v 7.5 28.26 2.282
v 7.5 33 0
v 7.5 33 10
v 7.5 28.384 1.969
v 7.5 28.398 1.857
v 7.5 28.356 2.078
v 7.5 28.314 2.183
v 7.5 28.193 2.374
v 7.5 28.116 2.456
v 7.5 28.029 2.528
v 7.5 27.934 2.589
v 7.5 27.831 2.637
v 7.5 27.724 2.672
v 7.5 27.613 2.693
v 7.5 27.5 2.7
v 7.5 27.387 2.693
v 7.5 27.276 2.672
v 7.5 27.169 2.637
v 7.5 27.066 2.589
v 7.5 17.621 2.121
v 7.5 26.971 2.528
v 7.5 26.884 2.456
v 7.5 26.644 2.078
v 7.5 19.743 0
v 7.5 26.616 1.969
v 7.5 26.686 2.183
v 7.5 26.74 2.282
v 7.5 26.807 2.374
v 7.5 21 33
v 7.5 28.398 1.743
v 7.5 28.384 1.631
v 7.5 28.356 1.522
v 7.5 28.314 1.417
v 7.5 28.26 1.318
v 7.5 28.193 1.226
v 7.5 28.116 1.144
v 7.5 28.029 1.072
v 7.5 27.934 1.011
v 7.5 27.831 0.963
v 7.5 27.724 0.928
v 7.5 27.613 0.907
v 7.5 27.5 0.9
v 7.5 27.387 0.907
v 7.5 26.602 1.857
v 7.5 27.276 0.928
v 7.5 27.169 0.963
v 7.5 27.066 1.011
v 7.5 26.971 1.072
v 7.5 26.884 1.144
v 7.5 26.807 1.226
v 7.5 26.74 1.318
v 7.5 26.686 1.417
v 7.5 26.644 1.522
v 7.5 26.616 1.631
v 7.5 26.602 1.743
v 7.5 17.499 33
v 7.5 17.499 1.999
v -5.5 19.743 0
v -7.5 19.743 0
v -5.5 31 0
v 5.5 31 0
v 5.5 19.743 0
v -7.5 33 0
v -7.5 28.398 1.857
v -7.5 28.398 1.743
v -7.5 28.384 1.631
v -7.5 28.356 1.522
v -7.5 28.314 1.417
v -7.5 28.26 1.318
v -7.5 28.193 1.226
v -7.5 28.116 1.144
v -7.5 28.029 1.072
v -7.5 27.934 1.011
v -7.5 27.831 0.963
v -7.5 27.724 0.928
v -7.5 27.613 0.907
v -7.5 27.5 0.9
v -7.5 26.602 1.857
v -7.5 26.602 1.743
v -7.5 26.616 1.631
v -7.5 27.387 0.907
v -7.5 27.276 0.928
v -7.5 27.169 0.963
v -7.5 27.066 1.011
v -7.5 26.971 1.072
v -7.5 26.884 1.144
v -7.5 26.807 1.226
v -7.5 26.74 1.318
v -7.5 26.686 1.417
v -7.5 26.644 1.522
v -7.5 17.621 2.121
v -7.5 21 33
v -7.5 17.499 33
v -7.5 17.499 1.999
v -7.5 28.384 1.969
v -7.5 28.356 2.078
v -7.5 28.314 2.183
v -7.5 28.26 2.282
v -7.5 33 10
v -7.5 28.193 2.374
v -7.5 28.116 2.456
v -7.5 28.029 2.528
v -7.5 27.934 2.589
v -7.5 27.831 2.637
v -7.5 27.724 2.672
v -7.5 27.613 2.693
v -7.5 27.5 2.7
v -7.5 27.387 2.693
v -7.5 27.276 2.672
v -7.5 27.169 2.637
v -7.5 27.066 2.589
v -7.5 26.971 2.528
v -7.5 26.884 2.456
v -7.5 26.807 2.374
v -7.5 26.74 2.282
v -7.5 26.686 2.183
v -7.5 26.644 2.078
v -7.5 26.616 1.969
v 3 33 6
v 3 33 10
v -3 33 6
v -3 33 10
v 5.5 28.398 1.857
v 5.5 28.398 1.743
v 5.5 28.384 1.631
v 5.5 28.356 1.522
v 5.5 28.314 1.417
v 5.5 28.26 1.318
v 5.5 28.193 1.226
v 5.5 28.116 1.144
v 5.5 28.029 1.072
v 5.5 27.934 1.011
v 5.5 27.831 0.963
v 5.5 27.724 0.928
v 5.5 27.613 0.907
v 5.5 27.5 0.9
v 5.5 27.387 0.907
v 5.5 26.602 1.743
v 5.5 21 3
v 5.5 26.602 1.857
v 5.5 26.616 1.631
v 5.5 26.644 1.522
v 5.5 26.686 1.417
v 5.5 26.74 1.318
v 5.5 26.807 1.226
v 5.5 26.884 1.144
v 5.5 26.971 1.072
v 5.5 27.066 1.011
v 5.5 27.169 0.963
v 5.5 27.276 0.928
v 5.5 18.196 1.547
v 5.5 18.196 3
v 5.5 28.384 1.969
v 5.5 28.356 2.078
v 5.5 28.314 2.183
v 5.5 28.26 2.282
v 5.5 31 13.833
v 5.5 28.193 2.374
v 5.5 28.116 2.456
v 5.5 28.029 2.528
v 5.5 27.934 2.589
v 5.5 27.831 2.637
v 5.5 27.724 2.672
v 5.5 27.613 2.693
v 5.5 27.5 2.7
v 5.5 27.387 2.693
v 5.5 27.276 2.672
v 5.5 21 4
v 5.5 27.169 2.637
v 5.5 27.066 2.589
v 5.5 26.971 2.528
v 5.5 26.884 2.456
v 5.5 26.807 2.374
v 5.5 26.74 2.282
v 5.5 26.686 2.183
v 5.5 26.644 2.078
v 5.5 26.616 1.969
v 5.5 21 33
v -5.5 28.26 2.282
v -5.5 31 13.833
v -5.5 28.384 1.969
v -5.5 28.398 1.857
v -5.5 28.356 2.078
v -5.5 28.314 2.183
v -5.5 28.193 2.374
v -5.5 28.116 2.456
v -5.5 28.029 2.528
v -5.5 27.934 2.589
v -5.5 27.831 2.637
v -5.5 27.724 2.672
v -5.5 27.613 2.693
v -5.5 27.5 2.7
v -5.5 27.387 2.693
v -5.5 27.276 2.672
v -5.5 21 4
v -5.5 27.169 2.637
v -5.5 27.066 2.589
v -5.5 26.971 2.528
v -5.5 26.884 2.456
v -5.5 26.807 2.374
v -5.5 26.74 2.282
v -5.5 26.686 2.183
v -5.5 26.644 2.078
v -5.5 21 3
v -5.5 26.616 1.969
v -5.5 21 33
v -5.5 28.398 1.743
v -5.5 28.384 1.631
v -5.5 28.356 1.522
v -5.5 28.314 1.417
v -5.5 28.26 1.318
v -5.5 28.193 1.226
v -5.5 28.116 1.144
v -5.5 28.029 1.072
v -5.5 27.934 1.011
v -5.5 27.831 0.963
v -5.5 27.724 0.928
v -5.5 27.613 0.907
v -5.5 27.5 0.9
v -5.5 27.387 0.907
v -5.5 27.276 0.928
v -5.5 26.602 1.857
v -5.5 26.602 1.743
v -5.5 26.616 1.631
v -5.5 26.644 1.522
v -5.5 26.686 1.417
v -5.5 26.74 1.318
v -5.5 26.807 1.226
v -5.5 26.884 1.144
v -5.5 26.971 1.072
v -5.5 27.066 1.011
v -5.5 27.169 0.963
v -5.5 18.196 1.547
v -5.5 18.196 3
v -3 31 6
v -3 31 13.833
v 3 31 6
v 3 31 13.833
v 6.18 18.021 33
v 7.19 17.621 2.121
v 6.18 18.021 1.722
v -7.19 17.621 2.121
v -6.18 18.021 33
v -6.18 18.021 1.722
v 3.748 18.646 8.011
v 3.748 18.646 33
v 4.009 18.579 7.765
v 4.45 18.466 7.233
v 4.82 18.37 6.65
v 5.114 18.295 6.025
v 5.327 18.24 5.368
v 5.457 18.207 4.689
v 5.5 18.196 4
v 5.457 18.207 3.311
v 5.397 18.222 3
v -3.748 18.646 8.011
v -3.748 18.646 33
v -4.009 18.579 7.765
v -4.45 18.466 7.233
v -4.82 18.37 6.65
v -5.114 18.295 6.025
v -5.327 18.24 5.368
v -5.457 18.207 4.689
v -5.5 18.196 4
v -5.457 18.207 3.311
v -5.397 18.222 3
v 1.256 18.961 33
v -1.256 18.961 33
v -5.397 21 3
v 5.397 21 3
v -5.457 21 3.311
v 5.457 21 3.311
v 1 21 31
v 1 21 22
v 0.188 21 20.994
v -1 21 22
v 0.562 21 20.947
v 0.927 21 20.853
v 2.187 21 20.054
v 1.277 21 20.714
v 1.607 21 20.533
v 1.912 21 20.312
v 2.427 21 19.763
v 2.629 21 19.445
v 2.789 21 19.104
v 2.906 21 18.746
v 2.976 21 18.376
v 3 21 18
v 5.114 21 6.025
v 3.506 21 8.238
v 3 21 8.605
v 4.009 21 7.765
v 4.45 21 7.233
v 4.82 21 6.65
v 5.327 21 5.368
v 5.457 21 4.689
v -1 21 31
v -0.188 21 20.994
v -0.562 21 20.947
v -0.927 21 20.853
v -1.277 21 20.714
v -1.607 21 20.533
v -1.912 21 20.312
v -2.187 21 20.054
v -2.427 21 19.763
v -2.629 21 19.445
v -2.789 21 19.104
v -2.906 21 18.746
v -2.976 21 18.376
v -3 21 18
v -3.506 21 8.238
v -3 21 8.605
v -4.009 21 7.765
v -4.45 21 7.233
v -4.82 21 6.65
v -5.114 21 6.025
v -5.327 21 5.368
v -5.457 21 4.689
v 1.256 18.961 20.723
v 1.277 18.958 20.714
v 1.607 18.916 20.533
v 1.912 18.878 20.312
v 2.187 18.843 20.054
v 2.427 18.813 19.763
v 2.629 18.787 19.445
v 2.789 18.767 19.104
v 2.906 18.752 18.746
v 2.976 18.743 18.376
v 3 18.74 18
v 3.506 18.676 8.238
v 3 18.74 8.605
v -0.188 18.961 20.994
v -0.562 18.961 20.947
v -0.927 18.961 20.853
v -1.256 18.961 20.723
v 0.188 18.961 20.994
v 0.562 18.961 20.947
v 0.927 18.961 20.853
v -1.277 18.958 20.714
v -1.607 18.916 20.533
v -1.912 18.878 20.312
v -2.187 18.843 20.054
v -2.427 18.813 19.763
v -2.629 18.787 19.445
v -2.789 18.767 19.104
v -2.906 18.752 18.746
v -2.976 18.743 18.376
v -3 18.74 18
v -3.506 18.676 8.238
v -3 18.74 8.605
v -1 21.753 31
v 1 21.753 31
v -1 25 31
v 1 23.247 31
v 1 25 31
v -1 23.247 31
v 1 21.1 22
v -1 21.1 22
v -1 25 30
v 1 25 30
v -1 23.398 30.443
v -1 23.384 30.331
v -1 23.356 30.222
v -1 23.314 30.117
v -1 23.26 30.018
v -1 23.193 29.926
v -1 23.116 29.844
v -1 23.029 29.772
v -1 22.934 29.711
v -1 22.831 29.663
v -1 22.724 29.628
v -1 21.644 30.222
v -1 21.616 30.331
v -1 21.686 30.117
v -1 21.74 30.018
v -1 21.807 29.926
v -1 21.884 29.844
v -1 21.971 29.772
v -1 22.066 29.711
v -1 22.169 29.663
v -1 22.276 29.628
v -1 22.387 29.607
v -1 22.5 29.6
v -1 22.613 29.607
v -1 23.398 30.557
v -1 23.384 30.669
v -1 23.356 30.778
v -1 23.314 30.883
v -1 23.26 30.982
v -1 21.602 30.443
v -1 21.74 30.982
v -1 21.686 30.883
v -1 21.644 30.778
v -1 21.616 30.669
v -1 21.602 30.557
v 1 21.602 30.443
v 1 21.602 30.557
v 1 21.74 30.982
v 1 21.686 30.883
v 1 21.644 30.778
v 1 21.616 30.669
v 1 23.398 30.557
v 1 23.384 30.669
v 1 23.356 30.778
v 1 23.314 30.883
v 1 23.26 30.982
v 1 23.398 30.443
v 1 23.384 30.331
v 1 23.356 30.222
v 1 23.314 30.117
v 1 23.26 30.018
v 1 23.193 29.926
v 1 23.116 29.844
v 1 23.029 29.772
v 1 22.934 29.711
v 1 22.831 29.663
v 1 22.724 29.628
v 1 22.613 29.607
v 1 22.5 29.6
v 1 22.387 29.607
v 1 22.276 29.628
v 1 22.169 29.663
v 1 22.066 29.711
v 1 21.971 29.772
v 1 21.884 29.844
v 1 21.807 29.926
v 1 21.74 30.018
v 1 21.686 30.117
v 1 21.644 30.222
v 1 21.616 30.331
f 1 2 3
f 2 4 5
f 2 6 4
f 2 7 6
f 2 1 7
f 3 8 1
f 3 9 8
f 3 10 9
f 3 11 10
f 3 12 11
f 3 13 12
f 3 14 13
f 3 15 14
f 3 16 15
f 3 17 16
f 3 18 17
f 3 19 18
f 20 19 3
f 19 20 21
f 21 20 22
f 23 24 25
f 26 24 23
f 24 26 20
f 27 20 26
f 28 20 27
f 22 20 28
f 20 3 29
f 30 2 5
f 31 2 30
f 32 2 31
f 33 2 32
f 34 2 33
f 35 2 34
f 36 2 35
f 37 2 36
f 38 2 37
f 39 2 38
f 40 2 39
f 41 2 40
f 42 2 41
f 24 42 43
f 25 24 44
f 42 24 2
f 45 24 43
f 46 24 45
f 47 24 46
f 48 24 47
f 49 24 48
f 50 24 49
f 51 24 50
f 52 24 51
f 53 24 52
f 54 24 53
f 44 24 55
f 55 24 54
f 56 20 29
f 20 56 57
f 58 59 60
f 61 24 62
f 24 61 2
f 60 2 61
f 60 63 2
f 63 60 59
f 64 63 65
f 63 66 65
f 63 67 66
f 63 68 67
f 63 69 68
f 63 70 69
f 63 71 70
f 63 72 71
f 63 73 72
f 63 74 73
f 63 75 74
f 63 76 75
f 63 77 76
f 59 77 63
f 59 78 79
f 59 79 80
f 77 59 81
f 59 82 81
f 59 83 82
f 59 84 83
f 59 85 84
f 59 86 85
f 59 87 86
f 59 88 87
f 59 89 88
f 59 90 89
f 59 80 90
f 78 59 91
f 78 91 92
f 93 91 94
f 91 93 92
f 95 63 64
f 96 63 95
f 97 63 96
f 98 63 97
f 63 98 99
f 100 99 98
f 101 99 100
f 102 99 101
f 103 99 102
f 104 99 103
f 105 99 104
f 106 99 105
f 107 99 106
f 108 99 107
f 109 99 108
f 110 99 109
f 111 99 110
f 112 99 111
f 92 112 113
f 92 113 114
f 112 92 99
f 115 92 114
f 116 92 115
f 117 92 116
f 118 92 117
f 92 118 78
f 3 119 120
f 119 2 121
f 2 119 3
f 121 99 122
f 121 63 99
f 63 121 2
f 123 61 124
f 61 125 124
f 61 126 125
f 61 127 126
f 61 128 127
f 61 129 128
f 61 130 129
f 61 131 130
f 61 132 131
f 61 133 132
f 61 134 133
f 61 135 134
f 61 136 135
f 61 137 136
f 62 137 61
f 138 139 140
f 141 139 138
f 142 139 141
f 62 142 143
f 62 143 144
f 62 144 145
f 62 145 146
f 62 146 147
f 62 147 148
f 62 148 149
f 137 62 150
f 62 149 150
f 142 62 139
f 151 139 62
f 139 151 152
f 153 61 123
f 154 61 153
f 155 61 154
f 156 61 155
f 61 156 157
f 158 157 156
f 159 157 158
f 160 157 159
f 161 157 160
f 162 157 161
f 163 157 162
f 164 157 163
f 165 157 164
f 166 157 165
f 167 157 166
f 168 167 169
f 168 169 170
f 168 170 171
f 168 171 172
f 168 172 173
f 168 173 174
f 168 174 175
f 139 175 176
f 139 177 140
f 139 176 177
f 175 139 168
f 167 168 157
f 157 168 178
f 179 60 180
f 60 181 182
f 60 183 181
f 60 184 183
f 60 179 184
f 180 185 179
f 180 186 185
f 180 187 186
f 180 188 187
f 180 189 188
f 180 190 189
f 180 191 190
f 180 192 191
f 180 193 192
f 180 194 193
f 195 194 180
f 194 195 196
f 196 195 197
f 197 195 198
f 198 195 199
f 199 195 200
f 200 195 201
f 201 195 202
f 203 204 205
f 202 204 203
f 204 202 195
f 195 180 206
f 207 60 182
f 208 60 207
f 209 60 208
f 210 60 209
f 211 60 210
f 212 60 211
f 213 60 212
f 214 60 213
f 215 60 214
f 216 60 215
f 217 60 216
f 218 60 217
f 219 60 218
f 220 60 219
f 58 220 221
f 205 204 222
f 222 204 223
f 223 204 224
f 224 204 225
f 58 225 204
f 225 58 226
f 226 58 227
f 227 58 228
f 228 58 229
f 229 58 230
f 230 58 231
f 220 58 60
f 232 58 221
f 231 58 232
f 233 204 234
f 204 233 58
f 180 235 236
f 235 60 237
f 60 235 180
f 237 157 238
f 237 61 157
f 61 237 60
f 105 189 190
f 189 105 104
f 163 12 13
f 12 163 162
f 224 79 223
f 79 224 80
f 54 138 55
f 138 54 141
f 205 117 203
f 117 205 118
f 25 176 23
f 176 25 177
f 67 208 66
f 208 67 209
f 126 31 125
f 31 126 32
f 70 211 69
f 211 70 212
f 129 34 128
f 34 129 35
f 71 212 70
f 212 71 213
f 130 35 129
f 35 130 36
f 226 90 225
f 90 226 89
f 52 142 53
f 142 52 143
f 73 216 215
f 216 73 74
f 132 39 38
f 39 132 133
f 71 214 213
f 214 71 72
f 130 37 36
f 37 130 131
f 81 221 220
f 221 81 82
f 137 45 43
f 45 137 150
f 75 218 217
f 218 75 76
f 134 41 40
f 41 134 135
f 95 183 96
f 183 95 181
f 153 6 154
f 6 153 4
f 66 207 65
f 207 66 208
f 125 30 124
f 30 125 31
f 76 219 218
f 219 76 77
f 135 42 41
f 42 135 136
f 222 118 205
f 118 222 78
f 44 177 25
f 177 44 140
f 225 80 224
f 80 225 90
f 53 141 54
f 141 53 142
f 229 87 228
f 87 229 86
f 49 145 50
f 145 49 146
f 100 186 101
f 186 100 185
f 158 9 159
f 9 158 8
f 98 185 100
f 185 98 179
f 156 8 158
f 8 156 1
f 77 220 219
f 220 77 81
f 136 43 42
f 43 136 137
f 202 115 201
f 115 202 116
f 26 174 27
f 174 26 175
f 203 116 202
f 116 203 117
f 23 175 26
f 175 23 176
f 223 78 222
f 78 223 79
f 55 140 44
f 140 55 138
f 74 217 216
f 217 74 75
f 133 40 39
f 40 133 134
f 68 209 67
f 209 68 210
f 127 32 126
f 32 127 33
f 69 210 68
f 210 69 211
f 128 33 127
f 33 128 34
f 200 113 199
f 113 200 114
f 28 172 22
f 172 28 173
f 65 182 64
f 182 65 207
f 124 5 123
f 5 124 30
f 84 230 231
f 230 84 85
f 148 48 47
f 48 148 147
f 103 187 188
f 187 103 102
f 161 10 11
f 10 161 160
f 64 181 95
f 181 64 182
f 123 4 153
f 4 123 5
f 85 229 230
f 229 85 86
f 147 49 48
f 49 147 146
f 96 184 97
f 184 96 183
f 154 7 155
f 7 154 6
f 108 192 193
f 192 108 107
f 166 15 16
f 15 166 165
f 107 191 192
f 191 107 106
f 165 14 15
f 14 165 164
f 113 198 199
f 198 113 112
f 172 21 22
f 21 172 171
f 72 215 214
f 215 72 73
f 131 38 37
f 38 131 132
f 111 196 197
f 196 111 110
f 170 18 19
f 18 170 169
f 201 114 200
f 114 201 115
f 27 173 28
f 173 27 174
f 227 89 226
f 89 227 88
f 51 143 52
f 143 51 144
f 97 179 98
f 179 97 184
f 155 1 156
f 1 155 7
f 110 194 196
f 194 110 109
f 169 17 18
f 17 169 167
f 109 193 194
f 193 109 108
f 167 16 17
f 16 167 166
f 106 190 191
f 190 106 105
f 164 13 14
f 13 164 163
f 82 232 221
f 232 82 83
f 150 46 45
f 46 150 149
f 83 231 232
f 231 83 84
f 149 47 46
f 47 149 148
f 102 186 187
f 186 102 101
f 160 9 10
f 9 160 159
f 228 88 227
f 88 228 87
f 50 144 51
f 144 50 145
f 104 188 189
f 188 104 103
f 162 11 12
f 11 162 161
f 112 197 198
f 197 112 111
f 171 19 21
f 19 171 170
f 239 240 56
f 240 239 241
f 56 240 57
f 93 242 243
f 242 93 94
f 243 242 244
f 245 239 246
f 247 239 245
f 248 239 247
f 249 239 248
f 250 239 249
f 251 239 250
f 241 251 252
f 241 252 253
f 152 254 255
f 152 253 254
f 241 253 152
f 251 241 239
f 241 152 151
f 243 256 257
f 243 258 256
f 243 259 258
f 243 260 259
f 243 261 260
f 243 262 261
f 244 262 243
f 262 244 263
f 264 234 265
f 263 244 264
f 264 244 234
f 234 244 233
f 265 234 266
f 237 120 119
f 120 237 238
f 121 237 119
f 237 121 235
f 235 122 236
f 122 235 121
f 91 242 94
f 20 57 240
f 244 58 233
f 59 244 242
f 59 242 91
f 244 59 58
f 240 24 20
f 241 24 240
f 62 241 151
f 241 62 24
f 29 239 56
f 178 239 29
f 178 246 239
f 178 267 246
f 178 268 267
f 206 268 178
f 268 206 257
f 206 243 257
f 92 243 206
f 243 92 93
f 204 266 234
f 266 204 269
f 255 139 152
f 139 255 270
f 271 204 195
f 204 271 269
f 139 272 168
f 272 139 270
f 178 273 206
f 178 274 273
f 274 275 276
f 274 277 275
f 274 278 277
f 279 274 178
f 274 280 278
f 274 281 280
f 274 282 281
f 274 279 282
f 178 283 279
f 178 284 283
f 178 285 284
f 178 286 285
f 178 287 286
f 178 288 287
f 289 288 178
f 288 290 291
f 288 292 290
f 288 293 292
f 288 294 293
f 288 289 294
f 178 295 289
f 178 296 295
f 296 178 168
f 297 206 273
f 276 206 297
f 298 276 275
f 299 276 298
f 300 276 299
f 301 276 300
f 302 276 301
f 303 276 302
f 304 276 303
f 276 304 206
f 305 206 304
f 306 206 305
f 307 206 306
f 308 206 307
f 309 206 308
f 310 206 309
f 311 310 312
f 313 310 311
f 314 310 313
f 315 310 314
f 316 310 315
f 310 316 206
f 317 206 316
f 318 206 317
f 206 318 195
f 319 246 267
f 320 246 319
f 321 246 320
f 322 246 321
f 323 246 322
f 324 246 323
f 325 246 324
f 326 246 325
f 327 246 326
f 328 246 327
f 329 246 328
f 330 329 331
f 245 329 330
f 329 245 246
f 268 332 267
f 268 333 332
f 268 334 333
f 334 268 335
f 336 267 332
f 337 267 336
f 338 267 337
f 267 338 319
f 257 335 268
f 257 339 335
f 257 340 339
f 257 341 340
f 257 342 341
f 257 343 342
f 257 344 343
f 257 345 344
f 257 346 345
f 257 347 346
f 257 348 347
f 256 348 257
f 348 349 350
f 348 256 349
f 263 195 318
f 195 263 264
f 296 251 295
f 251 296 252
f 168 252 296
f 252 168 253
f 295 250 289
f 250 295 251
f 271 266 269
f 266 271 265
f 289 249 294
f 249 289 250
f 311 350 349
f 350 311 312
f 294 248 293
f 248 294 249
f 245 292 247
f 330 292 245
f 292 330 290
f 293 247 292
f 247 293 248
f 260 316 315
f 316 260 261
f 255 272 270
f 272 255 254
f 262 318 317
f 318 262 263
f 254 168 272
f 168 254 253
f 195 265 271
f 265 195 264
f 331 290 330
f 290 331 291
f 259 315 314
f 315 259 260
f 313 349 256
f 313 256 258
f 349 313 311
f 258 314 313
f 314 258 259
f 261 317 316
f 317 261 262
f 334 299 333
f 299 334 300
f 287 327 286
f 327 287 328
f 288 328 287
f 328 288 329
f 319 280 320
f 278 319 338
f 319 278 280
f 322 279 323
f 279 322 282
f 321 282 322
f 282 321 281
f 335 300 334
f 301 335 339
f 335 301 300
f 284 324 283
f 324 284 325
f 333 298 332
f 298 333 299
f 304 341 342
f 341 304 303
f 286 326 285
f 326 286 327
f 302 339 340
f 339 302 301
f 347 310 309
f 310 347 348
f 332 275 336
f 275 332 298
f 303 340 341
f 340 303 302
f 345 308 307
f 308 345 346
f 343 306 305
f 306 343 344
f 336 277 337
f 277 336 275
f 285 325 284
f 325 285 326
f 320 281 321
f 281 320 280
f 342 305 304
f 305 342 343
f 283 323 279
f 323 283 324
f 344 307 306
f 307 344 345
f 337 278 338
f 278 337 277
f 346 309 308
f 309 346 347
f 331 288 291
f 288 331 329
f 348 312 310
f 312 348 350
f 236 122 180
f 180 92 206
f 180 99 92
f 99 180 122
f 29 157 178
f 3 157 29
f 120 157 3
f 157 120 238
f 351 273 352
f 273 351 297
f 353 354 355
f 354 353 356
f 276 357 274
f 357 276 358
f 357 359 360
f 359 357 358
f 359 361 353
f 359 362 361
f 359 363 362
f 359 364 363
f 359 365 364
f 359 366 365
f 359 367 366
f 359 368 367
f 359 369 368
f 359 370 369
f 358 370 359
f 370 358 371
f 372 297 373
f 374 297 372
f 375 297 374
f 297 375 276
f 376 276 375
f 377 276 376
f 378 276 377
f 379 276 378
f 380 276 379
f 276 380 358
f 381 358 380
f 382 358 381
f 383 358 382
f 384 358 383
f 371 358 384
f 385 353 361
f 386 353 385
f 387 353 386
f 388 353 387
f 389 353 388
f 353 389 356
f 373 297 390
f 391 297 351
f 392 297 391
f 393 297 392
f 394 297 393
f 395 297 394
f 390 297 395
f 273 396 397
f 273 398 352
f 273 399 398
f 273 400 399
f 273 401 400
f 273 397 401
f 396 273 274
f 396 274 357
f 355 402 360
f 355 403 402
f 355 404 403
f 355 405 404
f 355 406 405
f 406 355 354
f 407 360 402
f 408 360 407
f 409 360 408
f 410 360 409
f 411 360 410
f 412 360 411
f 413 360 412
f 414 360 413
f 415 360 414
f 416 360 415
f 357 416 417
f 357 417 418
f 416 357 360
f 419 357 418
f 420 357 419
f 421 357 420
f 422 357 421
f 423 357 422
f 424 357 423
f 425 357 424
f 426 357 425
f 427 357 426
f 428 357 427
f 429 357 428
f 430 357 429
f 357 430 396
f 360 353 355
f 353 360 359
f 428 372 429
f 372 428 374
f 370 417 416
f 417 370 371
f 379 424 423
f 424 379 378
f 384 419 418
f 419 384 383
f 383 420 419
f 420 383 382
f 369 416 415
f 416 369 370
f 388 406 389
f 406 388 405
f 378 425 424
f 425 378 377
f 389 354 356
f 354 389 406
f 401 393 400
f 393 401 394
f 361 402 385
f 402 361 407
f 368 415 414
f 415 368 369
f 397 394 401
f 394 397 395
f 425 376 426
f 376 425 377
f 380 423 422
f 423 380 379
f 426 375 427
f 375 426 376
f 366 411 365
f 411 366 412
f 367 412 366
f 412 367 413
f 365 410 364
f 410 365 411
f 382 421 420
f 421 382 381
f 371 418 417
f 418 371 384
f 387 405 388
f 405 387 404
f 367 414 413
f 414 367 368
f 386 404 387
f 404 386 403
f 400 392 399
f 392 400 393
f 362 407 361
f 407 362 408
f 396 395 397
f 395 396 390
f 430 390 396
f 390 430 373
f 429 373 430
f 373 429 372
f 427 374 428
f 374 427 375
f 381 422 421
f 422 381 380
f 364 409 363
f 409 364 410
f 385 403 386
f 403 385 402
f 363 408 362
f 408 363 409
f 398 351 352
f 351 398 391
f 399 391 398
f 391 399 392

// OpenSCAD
$fn=50;
difference()
	{
	translate([-7.5,17,0]) cube([15,16,10]);
	translate([-5.5,17,-1]) cube([11,14,12]);
	translate([-8,27.5,1.8]) rotate([0,90,0]) cylinder(d=1.8,h=25);
	translate([0,-1,0])cylinder(d=40,h=11);
	translate([-3,30,6]) cube([6,6,5]);
	translate([-8,15.5,0]) rotate([45,0,0]) rotate([0,90,0]) cube([3,3,16]);
	}
difference()
{
	translate([-7.5,15,3]) cube([15,6,30]);
	translate([0,-1,0])cylinder(d=40,h=36);
	translate([0,22,4]) rotate([90,0,0]) cylinder(d=11,h=10);
	translate([0,22,18]) rotate([90,0,0]) cylinder(d=6,h=10);
	translate([-3,17,0])cube([6,6,18]);
}

difference()
{
	hull()
	{
		translate([-7.5,17,9.9]) cube([15,16,0.1]);
		difference()
		{
			translate([-7.5,15,3]) cube([15,6,30]);
			translate([0,-1,0])cylinder(d=40,h=36);
		}
	}
		translate([-5.5,17,0]) cube([11,14,34]);
		translate([0,-1,0]) cylinder(d=40,h=35);
		translate([-3,30,6]) cube([6,6,8]);
}
difference()
{
	hull()
	{
		translate([-1,21,30]) cube([2,4,1]);
		translate([-1,21,22]) cube([2,0.1,0.1]);
	}
	translate([-8,22.5,30.5]) rotate([0,90,0]) cylinder(d=1.8,h=25);
}
//difference()
//{
//	translate([0,-1.25,0])cylinder(d=44,h=20);
//	translate([0,-1.25,-1])cylinder(d=40.5,h=36);
//	translate([-7.5,17,-1]) cube([15,16,25]);
//	%translate([-24,0,10]) rotate([0,90,0]) cylinder(d=3,h=50);
//}
